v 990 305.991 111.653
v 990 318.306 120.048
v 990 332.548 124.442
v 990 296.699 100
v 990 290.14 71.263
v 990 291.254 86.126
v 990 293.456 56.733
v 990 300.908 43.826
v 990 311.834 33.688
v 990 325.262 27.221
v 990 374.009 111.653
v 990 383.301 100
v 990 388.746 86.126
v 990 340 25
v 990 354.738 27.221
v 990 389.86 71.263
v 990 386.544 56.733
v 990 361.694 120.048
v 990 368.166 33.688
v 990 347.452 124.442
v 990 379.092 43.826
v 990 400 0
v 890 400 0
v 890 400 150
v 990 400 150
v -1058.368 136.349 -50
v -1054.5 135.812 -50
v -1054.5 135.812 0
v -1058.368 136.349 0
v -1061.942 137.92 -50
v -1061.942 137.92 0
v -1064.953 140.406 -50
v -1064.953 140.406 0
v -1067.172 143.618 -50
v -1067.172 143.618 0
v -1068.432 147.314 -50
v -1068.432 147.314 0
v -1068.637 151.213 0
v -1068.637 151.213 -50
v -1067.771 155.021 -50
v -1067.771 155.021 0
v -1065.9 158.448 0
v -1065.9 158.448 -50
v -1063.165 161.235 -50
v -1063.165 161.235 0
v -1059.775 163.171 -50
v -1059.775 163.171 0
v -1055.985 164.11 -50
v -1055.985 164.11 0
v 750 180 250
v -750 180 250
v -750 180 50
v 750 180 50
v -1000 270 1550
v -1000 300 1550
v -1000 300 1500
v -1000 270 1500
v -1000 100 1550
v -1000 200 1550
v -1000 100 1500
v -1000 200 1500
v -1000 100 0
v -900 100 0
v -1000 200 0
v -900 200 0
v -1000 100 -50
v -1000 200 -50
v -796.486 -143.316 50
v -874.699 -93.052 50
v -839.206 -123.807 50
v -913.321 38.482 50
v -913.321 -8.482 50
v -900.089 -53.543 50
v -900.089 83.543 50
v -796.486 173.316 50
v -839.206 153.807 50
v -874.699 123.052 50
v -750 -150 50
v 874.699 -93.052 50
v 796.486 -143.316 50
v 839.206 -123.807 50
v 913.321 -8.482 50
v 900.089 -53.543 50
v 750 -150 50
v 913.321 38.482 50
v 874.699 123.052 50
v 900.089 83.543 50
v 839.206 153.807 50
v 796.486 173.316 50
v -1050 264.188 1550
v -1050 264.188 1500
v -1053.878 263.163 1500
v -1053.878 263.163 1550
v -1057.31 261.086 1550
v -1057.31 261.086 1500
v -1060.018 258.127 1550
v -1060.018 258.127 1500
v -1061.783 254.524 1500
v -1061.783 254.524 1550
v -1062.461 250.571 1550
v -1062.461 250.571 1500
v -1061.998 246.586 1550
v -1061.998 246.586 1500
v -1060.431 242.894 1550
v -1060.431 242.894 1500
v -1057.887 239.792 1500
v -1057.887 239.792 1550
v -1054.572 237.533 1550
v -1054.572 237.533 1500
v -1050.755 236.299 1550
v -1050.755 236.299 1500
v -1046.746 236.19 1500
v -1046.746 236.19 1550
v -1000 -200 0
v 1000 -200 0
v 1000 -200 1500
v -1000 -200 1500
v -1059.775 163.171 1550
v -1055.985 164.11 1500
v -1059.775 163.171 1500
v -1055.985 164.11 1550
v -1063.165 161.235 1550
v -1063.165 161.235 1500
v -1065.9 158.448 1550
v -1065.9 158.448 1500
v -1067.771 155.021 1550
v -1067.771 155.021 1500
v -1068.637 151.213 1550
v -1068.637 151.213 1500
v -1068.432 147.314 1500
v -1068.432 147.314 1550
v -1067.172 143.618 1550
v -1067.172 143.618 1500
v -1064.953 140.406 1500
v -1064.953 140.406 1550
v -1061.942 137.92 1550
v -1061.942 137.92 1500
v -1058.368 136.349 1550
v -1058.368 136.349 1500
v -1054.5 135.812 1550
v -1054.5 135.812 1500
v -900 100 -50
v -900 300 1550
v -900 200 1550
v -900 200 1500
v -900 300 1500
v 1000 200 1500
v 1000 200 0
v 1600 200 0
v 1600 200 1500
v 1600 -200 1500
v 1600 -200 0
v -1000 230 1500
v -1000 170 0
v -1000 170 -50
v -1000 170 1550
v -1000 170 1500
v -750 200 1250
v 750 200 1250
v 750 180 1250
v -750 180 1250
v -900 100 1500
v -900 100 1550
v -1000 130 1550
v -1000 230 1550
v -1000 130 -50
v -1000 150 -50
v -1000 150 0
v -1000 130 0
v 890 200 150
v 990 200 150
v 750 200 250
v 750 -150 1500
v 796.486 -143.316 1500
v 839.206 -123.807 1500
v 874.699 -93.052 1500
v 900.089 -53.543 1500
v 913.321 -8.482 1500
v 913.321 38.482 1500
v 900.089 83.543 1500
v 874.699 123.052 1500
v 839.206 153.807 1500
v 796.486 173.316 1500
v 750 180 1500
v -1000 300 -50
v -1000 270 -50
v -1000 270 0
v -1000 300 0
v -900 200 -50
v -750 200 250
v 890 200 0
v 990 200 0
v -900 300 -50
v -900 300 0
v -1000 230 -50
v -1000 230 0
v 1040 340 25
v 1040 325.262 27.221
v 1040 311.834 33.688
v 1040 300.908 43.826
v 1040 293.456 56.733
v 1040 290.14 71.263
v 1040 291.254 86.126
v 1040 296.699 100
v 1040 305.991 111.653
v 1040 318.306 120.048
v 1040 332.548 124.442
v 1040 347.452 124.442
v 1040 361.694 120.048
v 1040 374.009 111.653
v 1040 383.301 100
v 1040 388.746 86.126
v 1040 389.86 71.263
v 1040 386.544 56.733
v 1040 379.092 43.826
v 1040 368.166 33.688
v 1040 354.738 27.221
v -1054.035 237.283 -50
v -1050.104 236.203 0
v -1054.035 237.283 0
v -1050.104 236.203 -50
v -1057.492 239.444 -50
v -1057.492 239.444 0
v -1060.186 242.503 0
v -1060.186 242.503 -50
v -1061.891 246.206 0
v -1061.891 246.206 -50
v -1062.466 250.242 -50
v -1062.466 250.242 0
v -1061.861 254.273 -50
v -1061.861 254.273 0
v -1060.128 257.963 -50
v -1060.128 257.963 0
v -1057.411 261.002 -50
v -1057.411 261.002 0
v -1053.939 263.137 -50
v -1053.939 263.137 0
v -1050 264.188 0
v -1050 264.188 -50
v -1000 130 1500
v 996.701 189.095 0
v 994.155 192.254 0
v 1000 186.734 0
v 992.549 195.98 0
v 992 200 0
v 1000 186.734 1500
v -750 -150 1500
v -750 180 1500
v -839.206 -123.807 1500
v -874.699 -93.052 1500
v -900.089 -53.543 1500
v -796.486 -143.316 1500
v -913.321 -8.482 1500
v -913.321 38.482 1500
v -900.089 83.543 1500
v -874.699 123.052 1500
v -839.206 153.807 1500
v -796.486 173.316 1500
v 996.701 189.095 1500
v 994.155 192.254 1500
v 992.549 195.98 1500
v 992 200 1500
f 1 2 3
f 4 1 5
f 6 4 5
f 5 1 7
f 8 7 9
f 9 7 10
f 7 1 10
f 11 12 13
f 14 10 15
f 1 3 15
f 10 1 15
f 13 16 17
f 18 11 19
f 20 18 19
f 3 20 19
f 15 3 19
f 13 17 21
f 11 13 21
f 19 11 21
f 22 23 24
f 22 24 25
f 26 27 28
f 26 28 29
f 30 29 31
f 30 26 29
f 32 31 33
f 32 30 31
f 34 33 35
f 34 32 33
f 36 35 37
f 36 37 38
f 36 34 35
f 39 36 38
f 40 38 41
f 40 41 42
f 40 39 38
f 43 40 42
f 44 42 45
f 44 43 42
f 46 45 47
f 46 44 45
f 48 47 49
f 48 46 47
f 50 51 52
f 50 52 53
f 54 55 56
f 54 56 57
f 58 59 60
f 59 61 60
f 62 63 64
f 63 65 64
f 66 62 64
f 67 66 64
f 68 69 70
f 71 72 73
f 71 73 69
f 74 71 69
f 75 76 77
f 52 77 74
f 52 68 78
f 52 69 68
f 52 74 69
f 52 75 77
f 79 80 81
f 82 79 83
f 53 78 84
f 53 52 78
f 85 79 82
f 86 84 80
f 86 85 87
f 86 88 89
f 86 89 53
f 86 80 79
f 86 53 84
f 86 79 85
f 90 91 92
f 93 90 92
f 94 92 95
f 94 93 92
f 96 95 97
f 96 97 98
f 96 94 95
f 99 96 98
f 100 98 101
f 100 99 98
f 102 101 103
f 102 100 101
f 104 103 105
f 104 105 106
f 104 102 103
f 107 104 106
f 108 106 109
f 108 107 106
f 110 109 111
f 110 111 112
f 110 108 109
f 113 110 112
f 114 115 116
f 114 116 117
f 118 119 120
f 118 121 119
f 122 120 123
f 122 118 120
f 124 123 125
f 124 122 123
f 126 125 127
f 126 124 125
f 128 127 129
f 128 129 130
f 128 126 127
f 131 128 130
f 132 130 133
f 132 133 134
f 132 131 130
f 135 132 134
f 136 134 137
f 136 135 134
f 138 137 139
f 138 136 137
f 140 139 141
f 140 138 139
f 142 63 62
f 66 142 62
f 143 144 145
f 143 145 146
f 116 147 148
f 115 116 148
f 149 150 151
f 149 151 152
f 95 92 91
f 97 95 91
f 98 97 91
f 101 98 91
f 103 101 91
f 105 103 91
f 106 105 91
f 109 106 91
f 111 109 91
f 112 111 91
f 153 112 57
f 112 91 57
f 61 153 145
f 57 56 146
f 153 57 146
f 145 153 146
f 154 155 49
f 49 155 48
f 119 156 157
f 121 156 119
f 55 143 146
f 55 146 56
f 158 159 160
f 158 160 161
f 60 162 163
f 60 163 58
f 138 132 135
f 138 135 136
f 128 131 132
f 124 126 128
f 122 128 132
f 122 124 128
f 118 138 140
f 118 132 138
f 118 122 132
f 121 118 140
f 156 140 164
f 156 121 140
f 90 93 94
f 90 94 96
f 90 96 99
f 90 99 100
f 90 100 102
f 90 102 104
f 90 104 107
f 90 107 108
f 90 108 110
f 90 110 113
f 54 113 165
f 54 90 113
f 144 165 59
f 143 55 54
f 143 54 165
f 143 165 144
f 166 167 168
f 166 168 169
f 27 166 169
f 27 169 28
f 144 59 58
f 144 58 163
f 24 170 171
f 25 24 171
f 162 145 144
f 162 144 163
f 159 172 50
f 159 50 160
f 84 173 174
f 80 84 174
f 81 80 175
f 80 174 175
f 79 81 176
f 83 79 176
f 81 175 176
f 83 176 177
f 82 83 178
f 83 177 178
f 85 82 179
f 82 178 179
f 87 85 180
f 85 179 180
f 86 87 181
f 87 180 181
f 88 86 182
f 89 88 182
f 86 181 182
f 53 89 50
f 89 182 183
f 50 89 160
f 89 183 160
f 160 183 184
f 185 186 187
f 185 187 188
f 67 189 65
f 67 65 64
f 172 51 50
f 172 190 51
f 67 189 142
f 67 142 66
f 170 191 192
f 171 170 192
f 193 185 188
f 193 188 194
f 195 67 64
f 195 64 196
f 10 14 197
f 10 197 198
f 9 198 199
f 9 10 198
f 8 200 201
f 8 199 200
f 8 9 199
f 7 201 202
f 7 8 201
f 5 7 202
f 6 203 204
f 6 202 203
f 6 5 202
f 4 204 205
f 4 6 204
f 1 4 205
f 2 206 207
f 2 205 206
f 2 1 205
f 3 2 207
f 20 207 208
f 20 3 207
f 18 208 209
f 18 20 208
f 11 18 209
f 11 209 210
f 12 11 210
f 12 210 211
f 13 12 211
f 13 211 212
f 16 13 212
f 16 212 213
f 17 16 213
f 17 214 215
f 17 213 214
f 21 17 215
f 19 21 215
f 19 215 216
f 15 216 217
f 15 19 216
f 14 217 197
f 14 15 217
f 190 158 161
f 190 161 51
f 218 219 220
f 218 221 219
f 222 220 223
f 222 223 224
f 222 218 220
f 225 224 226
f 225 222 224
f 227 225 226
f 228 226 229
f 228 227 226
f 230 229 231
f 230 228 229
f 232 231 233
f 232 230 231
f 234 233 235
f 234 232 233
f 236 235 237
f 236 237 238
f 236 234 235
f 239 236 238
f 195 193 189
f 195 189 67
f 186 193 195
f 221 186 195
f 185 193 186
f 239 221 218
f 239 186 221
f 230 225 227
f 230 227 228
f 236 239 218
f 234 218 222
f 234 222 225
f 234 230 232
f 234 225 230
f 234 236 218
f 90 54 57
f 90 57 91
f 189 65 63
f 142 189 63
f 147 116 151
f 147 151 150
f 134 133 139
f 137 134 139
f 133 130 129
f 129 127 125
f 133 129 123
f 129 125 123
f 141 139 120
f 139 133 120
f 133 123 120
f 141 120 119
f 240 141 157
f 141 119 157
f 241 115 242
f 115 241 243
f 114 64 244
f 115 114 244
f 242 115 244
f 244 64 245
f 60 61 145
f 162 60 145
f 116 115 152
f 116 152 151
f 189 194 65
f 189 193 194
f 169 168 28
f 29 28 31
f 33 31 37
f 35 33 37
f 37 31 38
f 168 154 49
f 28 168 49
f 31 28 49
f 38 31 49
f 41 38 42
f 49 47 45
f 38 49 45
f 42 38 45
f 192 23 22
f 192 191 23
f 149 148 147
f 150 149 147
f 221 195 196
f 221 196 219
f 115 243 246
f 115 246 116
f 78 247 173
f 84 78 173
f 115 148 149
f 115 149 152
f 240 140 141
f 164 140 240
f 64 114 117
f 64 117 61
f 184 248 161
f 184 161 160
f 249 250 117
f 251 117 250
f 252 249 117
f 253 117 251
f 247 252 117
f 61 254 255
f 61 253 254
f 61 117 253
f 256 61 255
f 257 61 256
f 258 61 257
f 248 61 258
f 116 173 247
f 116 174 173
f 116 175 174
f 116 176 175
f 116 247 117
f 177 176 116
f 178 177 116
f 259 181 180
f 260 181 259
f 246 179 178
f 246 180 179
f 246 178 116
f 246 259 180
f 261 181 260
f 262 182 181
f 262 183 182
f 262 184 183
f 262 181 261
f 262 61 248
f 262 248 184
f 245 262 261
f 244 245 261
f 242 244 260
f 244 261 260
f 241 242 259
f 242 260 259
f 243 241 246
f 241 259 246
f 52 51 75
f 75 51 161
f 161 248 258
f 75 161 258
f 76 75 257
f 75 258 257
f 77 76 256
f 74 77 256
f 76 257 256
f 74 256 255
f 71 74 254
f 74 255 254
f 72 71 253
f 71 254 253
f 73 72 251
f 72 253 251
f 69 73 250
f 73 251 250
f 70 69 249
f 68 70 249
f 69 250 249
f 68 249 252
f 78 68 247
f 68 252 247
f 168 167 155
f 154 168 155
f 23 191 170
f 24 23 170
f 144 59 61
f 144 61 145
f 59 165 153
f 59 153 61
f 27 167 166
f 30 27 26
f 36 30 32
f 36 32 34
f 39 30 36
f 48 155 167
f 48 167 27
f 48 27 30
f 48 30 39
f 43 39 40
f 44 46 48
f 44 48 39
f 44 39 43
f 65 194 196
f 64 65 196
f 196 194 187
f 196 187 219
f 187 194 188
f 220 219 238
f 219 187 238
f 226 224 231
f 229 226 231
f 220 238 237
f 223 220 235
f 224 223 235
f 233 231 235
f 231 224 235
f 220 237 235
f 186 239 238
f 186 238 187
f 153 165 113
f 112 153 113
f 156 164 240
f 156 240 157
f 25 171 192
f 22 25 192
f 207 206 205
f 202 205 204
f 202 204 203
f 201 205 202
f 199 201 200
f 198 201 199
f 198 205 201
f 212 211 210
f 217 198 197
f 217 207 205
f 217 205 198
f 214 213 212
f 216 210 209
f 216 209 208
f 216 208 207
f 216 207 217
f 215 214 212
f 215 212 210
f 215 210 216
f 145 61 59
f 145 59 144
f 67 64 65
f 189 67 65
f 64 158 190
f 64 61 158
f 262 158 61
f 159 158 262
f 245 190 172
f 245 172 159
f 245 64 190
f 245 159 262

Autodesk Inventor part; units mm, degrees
ref_plane "YZ Plane" through (0, 0, 0) normal (1, 0, 0) x (0, 1, 0)
ref_plane "XZ Plane" through (0, 0, 0) normal (0, 1, 0) x (-1, 0, 0)
ref_plane "XY Plane" through (0, 0, 0) normal (0, 0, 1) x (1, 0, 0)
sketch "Boceto1" plane through (0, 0, 0) normal (0, 0, 1) x (1, 0, 0)
  point P0 (0, 0)
sketch "Boceto2" plane through (0, 0, 0) normal (0, 0, 1) x (1, 0, 0)
  line L0 (-1000, 200) -> (1000, 200)
  line L1 (1000, 200) -> (1000, -200)
  line L2 (1000, -200) -> (-1000, -200)
  line L3 (-1000, -200) -> (-1000, 200)
  point P0 (0, 0)
  point P1 (1000, 0)
  point P2 (0, 200)
  dimension "d0" = 2000
  dimension "d1" = 400
extrude "Extrusión1" add sketch "Boceto2" along normal blind 1500
sketch "Boceto3" plane through (-1000, 200, 0) normal (0, 1, 0) x (1, 0, 0)
  line L0 (2000, 0) -> (0, 0) construction
  line L1 (0, 0) -> (0, -1500) construction
  line L2 (2000, -1500) -> (0, -1500) construction
  line L3 (2000, 0) -> (2000, -1500) construction
  line L4 (1750, -1250) -> (250, -1250)
  line L5 (250, -1250) -> (250, -250)
  line L6 (250, -250) -> (1750, -250)
  line L7 (1750, -250) -> (1750, -1250)
  point P0 (1000, 0)
  point P1 (1750, -750)
  dimension "d4" = 1500
extrude "Extrusión2" cut sketch "Boceto3" against normal blind 350
sketch "Boceto4" plane through (0, 0, 1500) normal (0, 0, 1) x (1, 0, 0)
  line L0 (750, 200) -> (-750, 200) construction
  line L1 (750, 200) -> (750, -150) construction
  line L2 (750, -150) -> (-750, -150) construction
  line L3 (-750, 200) -> (-750, -150) construction
  line L4 (-750, 200) -> (-750, -150) projected
  line L5 (-750, -150) -> (750, -150) projected
  line L6 (-750, 180) -> (750, 180)
  line L7 (750, -150) -> (-750, -150)
  line L8 (750, 200) -> (750, -150) projected
  arc A0 (750, -150) -> (750, 180) centre (750, 15) ccw
  arc A1 (-750, 180) -> (-750, -150) centre (-750, 15) ccw
  point P0 (0, 0)
  dimension "d7" = 20
  dimension "d8" = 165
extrude "Extrusión3" cut sketch "Boceto4" against normal blind 1450
sketch "Boceto5" plane through (1000, -200, 0) normal (1, 0, 0) x (0, 0, -1)
  line L0 (0, 0) -> (0, 400) construction
  line L1 (0, 400) -> (-1500, 400) construction
  line L2 (-1500, 0) -> (-1500, 400) construction
  line L3 (0, 0) -> (-1500, 0) construction
  line L4 (0, 400) -> (-1500, 400) projected
  line L5 (-1500, 400) -> (0, 400)
  line L6 (0, 400) -> (0, 0)
  line L7 (0, 0) -> (-1500, 0)
  line L8 (-1500, 0) -> (-1500, 400)
  point P0 (0, 200)
extrude "Extrusión4" add sketch "Boceto5" along normal blind 600 separate body
sketch "Boceto6" plane through (-1000, 200, 0) normal (0, 1, 0) x (1, 0, 0)
  line L0 (250, -1250) -> (250, -250) construction
  line L1 (250, -250) -> (1750, -250) construction
  line L2 (1750, -250) -> (1750, -1250) construction
  line L3 (1750, -1250) -> (250, -1250) construction
  line L4 (2000, 0) -> (0, 0) construction
  line L5 (0, 0) -> (0, -1500) construction
  line L6 (2000, -1500) -> (0, -1500) construction
  line L7 (2000, 0) -> (2000, -1500) construction
  line L8 (0, 0) -> (2000, 0) projected
  line L9 (1990, 0) -> (1890, 0)
  line L10 (1890, 0) -> (1890, -150)
  line L11 (1890, -150) -> (1990, -150)
  line L12 (1990, -150) -> (1990, 0)
  point P0 (1000, 0)
  point P1 (1890, 0)
  dimension "d13" = 150
  dimension "d14" = 100
  dimension "d15" = 10
extrude "Extrusión5" add sketch "Boceto6" along normal blind 200 separate body
sketch "Boceto7" plane through (990, 200, 150) normal (1, 0, 0) x (0, 0, -1)
  line L0 (0, 0) -> (150, 0) construction
  line L1 (150, 0) -> (150, 200) construction
  line L2 (0, 200) -> (150, 200) construction
  line L3 (0, 0) -> (0, 200) construction
  circle A0 centre (75, 140) radius 50
  line L4 (0, 200) -> (150, 200) projected
  point P0 (150, -200)
  point P1 (75, 200)
  point P2 (75, 200)
  dimension "d18" = 100
  dimension "d19" = 60
extrude "Extrusión6" add sketch "Boceto7" along normal blind 50 separate body
sketch "Boceto8" plane through (0, 0, 1500) normal (0, 0, 1) x (1, 0, 0)
  line L0 (750, -150) -> (-750, -150) construction
  arc A0 (-750, 180) -> (-750, -150) centre (-750, 15) ccw construction
  line L1 (-750, 180) -> (750, 180) construction
  arc A1 (750, -150) -> (750, 180) centre (750, 15) ccw construction
  line L2 (-1000, -200) -> (1000, -200) construction
  line L3 (1000, -200) -> (1000, 200) construction
  line L4 (1000, 200) -> (-1000, 200) construction
  line L5 (-1000, 200) -> (-1000, -200) construction
  line L6 (1000, 200) -> (1000, -200) construction
  line L7 (1000, -200) -> (1600, -200) construction
  line L8 (1600, 200) -> (1600, -200) construction
  line L9 (1000, 200) -> (1600, 200) construction
  line L10 (1000, 200) -> (-1000, 200) projected
  line L11 (992, 200) -> (1022, 200)
  line L12 (1000, 200) -> (1600, 200) projected
  arc A2 (992, 200) -> (1022, 200) centre (1007, 200) ccw
  line L13 (890, 200) -> (990, 200) construction
  line L14 (990, 200) -> (990, 400) construction
  line L15 (890, 400) -> (990, 400) construction
  line L16 (890, 200) -> (890, 400) construction
  point P0 (0, 0)
  dimension "d22" = 30
  dimension "d24" = 2
extrude "Extrusión7" cut sketch "Boceto8" against normal through all bodies 1
sketch "Boceto9" plane through (0, 0, 1500) normal (0, 0, 1) x (1, 0, 0)
  arc A0 (992, 200) -> (1000, 186.7335) centre (1007, 200) ccw construction
  line L0 (992, 200) -> (-1000, 200) construction
  line L1 (-1000, 200) -> (-1000, -200) construction
  line L2 (-1000, -200) -> (1000, -200) construction
  line L3 (1000, -200) -> (1000, 186.7335) construction
  line L4 (750, -150) -> (-750, -150) construction
  arc A1 (-750, 180) -> (-750, -150) centre (-750, 15) ccw construction
  line L5 (-750, 180) -> (750, 180) construction
  arc A2 (750, -150) -> (750, 180) centre (750, 15) ccw construction
  line L6 (-1000, 200) -> (-1000, -200) projected
  line L7 (-1000, 200) -> (-900, 200)
  line L8 (-900, 200) -> (-900, 100)
  line L9 (-900, 100) -> (-1000, 100)
  line L10 (-1000, 100) -> (-1000, 200)
  point P0 (0, 0)
  dimension "d27" = 100
  dimension "d28" = 100
extrude "Extrusión8" add sketch "Boceto9" along normal blind 50 separate body
sketch "Boceto10" plane through (0, 0, 0) normal (0, 0, -1) x (-1, 0, 0)
  arc A0 (-1000, 186.7335) -> (-992, 200) centre (-1007, 200) ccw construction
  line L0 (-1000, -200) -> (-1000, 186.7335) construction
  line L1 (1000, -200) -> (-1000, -200) construction
  line L2 (1000, 200) -> (1000, -200) construction
  line L3 (-992, 200) -> (1000, 200) construction
  line L4 (1000, 200) -> (900, 200)
  line L5 (900, 200) -> (900, 100)
  line L6 (900, 100) -> (1000, 100)
  line L7 (1000, 100) -> (1000, 200)
  point P0 (0, 0)
  dimension "d31" = 100
  dimension "d32" = 100
extrude "Extrusión9" add sketch "Boceto10" along normal blind 50 separate body
sketch "Boceto11" plane through (0, 0, -50) normal (0, 0, -1) x (-1, 0, 0)
  line L0 (900, 200) -> (900, 100) construction
  line L1 (900, 100) -> (1000, 100) construction
  line L2 (1000, 100) -> (1000, 200) construction
  line L3 (1000, 200) -> (900, 200) construction
  circle A0 centre (1054.5004, 150) radius 50 construction
  line L4 (1000, 200) -> (1000, -200) construction
  line L5 (1000, 150) -> (1000, 170) construction
  circle A1 centre (1054.5004, 150) radius 14.1882 construction
  line L6 (1000, 150) -> (1000, 170)
  line L7 (1000, 170) -> (1055.9849, 164.1103)
  line L8 (1000, 150) -> (1000, 130)
  line L9 (1000, 130) -> (1054.5004, 135.8118)
  arc A2 (1054.5004, 135.8118) -> (1055.9849, 164.1103) centre (1054.5004, 150) ccw
  point P0 (0, 0)
  dimension "d35" = 100
  dimension "d36" = 20
  dimension "d37" = 20
extrude "Extrusión10" add sketch "Boceto11" against normal blind 50 separate body
sketch "Boceto12" plane through (0, 0, 1550) normal (0, 0, 1) x (1, 0, 0)
  line L0 (-900, 200) -> (-1000, 200) construction
  line L1 (-1000, 200) -> (-1000, 100) construction
  line L2 (-1000, 100) -> (-900, 100) construction
  line L3 (-900, 100) -> (-900, 200) construction
  arc A0 (-1055.9849, 164.1103) -> (-1054.5004, 135.8118) centre (-1054.5004, 150) ccw construction
  line L4 (-1054.5004, 135.8118) -> (-1000, 130) construction
  line L5 (-1000, 130) -> (-1000, 170) construction
  line L6 (-1000, 170) -> (-1055.9849, 164.1103) construction
  line L7 (-1000, 130) -> (-1000, 170)
  line L8 (-1000, 200) -> (-1000, -200) projected
  line L9 (-1000, 170) -> (-1055.9849, 164.1103) projected
  line L10 (-1000, 170) -> (-1055.9849, 164.1103)
  arc A1 (-1055.9849, 164.1103) -> (-1054.5004, 135.8118) centre (-1054.5004, 150) ccw
  line L11 (-1054.5004, 135.8118) -> (-1000, 130)
  point P0 (0, 0)
extrude "Extrusión11" add sketch "Boceto12" against normal blind 50 separate body
sketch "Boceto13" plane through (0, 0, 1550) normal (0, 0, 1) x (1, 0, 0)
  line L0 (-900, 200) -> (-1000, 200) construction
  line L1 (-1000, 200) -> (-1000, 100) construction
  line L2 (-1000, 100) -> (-900, 100) construction
  line L3 (-900, 100) -> (-900, 200) construction
  line L4 (-1000, 200) -> (-1000, -200) projected
  line L5 (-1000, 200) -> (-900, 200)
  line L6 (-900, 200) -> (-900, 300)
  line L7 (-900, 300) -> (-1000, 300)
  line L8 (-1000, 300) -> (-1000, 200)
  circle A0 centre (-1050, 250) radius 50 construction
  circle A1 centre (-1050, 250) radius 14.188 construction
  line L9 (-1000, 250) -> (-1000, 270)
  line L10 (-1000, 270) -> (-1050, 264.188)
  arc A2 (-1050, 264.188) -> (-1046.7455, 236.1903) centre (-1048.3728, 250.1891) ccw
  line L11 (-1000, 250) -> (-1000, 230)
  line L12 (-1000, 230) -> (-1046.7455, 236.1903)
  point P0 (0, 0)
  dimension "d50" = 100
  dimension "d48" = 100
  dimension "d49" = 100
  dimension "d51" = 28.376
  dimension "d52" = 20
  dimension "d53" = 20
  dimension "d54" = 50
  dimension "d55" = 46.7456
extrude "Extrusión12" add sketch "Boceto13" against normal blind 50 separate body
sketch "Boceto14" plane through (0, 0, -50) normal (0, 0, -1) x (-1, 0, 0)
  line L0 (1000, 270) -> (1000, 300) construction
  line L1 (1000, 300) -> (900, 300) construction
  line L2 (900, 300) -> (900, 200) construction
  line L3 (900, 200) -> (1000, 200) construction
  line L4 (1000, 200) -> (1000, 230) construction
  line L5 (1000, 230) -> (1046.7455, 236.1903) construction
  arc A0 (1046.7455, 236.1903) -> (1050, 264.188) centre (1048.3728, 250.1891) ccw construction
  line L6 (1050, 264.188) -> (1000, 270) construction
  line L7 (1000, 270) -> (1000, 300) projected
  line L8 (1000, 270) -> (1000, 300)
  line L9 (1000, 300) -> (900, 300) projected
  line L10 (1000, 300) -> (900, 300)
  line L11 (900, 300) -> (900, 200)
  line L12 (-992, 200) -> (1000, 200) construction
  line L13 (900, 200) -> (1000, 200)
  line L14 (1000, 200) -> (1000, 230) projected
  line L15 (1000, 200) -> (1000, 230)
  line L16 (1000, 230) -> (1050.1043, 236.2028)
  arc A1 (1050.1043, 236.2028) -> (1050, 264.188) centre (1048.3728, 250.1891) ccw
  line L17 (1050, 264.188) -> (1000, 270) projected
  line L18 (1050, 264.188) -> (1000, 270)
  point P0 (0, 0)
extrude "Extrusión13" add sketch "Boceto14" against normal blind 50 separate body
sketch "Boceto15" plane through (0, 0, 0) normal (1, 0, 0) x (0, 1, 0)
  point P0 (0, 0)
properties part number "base"
